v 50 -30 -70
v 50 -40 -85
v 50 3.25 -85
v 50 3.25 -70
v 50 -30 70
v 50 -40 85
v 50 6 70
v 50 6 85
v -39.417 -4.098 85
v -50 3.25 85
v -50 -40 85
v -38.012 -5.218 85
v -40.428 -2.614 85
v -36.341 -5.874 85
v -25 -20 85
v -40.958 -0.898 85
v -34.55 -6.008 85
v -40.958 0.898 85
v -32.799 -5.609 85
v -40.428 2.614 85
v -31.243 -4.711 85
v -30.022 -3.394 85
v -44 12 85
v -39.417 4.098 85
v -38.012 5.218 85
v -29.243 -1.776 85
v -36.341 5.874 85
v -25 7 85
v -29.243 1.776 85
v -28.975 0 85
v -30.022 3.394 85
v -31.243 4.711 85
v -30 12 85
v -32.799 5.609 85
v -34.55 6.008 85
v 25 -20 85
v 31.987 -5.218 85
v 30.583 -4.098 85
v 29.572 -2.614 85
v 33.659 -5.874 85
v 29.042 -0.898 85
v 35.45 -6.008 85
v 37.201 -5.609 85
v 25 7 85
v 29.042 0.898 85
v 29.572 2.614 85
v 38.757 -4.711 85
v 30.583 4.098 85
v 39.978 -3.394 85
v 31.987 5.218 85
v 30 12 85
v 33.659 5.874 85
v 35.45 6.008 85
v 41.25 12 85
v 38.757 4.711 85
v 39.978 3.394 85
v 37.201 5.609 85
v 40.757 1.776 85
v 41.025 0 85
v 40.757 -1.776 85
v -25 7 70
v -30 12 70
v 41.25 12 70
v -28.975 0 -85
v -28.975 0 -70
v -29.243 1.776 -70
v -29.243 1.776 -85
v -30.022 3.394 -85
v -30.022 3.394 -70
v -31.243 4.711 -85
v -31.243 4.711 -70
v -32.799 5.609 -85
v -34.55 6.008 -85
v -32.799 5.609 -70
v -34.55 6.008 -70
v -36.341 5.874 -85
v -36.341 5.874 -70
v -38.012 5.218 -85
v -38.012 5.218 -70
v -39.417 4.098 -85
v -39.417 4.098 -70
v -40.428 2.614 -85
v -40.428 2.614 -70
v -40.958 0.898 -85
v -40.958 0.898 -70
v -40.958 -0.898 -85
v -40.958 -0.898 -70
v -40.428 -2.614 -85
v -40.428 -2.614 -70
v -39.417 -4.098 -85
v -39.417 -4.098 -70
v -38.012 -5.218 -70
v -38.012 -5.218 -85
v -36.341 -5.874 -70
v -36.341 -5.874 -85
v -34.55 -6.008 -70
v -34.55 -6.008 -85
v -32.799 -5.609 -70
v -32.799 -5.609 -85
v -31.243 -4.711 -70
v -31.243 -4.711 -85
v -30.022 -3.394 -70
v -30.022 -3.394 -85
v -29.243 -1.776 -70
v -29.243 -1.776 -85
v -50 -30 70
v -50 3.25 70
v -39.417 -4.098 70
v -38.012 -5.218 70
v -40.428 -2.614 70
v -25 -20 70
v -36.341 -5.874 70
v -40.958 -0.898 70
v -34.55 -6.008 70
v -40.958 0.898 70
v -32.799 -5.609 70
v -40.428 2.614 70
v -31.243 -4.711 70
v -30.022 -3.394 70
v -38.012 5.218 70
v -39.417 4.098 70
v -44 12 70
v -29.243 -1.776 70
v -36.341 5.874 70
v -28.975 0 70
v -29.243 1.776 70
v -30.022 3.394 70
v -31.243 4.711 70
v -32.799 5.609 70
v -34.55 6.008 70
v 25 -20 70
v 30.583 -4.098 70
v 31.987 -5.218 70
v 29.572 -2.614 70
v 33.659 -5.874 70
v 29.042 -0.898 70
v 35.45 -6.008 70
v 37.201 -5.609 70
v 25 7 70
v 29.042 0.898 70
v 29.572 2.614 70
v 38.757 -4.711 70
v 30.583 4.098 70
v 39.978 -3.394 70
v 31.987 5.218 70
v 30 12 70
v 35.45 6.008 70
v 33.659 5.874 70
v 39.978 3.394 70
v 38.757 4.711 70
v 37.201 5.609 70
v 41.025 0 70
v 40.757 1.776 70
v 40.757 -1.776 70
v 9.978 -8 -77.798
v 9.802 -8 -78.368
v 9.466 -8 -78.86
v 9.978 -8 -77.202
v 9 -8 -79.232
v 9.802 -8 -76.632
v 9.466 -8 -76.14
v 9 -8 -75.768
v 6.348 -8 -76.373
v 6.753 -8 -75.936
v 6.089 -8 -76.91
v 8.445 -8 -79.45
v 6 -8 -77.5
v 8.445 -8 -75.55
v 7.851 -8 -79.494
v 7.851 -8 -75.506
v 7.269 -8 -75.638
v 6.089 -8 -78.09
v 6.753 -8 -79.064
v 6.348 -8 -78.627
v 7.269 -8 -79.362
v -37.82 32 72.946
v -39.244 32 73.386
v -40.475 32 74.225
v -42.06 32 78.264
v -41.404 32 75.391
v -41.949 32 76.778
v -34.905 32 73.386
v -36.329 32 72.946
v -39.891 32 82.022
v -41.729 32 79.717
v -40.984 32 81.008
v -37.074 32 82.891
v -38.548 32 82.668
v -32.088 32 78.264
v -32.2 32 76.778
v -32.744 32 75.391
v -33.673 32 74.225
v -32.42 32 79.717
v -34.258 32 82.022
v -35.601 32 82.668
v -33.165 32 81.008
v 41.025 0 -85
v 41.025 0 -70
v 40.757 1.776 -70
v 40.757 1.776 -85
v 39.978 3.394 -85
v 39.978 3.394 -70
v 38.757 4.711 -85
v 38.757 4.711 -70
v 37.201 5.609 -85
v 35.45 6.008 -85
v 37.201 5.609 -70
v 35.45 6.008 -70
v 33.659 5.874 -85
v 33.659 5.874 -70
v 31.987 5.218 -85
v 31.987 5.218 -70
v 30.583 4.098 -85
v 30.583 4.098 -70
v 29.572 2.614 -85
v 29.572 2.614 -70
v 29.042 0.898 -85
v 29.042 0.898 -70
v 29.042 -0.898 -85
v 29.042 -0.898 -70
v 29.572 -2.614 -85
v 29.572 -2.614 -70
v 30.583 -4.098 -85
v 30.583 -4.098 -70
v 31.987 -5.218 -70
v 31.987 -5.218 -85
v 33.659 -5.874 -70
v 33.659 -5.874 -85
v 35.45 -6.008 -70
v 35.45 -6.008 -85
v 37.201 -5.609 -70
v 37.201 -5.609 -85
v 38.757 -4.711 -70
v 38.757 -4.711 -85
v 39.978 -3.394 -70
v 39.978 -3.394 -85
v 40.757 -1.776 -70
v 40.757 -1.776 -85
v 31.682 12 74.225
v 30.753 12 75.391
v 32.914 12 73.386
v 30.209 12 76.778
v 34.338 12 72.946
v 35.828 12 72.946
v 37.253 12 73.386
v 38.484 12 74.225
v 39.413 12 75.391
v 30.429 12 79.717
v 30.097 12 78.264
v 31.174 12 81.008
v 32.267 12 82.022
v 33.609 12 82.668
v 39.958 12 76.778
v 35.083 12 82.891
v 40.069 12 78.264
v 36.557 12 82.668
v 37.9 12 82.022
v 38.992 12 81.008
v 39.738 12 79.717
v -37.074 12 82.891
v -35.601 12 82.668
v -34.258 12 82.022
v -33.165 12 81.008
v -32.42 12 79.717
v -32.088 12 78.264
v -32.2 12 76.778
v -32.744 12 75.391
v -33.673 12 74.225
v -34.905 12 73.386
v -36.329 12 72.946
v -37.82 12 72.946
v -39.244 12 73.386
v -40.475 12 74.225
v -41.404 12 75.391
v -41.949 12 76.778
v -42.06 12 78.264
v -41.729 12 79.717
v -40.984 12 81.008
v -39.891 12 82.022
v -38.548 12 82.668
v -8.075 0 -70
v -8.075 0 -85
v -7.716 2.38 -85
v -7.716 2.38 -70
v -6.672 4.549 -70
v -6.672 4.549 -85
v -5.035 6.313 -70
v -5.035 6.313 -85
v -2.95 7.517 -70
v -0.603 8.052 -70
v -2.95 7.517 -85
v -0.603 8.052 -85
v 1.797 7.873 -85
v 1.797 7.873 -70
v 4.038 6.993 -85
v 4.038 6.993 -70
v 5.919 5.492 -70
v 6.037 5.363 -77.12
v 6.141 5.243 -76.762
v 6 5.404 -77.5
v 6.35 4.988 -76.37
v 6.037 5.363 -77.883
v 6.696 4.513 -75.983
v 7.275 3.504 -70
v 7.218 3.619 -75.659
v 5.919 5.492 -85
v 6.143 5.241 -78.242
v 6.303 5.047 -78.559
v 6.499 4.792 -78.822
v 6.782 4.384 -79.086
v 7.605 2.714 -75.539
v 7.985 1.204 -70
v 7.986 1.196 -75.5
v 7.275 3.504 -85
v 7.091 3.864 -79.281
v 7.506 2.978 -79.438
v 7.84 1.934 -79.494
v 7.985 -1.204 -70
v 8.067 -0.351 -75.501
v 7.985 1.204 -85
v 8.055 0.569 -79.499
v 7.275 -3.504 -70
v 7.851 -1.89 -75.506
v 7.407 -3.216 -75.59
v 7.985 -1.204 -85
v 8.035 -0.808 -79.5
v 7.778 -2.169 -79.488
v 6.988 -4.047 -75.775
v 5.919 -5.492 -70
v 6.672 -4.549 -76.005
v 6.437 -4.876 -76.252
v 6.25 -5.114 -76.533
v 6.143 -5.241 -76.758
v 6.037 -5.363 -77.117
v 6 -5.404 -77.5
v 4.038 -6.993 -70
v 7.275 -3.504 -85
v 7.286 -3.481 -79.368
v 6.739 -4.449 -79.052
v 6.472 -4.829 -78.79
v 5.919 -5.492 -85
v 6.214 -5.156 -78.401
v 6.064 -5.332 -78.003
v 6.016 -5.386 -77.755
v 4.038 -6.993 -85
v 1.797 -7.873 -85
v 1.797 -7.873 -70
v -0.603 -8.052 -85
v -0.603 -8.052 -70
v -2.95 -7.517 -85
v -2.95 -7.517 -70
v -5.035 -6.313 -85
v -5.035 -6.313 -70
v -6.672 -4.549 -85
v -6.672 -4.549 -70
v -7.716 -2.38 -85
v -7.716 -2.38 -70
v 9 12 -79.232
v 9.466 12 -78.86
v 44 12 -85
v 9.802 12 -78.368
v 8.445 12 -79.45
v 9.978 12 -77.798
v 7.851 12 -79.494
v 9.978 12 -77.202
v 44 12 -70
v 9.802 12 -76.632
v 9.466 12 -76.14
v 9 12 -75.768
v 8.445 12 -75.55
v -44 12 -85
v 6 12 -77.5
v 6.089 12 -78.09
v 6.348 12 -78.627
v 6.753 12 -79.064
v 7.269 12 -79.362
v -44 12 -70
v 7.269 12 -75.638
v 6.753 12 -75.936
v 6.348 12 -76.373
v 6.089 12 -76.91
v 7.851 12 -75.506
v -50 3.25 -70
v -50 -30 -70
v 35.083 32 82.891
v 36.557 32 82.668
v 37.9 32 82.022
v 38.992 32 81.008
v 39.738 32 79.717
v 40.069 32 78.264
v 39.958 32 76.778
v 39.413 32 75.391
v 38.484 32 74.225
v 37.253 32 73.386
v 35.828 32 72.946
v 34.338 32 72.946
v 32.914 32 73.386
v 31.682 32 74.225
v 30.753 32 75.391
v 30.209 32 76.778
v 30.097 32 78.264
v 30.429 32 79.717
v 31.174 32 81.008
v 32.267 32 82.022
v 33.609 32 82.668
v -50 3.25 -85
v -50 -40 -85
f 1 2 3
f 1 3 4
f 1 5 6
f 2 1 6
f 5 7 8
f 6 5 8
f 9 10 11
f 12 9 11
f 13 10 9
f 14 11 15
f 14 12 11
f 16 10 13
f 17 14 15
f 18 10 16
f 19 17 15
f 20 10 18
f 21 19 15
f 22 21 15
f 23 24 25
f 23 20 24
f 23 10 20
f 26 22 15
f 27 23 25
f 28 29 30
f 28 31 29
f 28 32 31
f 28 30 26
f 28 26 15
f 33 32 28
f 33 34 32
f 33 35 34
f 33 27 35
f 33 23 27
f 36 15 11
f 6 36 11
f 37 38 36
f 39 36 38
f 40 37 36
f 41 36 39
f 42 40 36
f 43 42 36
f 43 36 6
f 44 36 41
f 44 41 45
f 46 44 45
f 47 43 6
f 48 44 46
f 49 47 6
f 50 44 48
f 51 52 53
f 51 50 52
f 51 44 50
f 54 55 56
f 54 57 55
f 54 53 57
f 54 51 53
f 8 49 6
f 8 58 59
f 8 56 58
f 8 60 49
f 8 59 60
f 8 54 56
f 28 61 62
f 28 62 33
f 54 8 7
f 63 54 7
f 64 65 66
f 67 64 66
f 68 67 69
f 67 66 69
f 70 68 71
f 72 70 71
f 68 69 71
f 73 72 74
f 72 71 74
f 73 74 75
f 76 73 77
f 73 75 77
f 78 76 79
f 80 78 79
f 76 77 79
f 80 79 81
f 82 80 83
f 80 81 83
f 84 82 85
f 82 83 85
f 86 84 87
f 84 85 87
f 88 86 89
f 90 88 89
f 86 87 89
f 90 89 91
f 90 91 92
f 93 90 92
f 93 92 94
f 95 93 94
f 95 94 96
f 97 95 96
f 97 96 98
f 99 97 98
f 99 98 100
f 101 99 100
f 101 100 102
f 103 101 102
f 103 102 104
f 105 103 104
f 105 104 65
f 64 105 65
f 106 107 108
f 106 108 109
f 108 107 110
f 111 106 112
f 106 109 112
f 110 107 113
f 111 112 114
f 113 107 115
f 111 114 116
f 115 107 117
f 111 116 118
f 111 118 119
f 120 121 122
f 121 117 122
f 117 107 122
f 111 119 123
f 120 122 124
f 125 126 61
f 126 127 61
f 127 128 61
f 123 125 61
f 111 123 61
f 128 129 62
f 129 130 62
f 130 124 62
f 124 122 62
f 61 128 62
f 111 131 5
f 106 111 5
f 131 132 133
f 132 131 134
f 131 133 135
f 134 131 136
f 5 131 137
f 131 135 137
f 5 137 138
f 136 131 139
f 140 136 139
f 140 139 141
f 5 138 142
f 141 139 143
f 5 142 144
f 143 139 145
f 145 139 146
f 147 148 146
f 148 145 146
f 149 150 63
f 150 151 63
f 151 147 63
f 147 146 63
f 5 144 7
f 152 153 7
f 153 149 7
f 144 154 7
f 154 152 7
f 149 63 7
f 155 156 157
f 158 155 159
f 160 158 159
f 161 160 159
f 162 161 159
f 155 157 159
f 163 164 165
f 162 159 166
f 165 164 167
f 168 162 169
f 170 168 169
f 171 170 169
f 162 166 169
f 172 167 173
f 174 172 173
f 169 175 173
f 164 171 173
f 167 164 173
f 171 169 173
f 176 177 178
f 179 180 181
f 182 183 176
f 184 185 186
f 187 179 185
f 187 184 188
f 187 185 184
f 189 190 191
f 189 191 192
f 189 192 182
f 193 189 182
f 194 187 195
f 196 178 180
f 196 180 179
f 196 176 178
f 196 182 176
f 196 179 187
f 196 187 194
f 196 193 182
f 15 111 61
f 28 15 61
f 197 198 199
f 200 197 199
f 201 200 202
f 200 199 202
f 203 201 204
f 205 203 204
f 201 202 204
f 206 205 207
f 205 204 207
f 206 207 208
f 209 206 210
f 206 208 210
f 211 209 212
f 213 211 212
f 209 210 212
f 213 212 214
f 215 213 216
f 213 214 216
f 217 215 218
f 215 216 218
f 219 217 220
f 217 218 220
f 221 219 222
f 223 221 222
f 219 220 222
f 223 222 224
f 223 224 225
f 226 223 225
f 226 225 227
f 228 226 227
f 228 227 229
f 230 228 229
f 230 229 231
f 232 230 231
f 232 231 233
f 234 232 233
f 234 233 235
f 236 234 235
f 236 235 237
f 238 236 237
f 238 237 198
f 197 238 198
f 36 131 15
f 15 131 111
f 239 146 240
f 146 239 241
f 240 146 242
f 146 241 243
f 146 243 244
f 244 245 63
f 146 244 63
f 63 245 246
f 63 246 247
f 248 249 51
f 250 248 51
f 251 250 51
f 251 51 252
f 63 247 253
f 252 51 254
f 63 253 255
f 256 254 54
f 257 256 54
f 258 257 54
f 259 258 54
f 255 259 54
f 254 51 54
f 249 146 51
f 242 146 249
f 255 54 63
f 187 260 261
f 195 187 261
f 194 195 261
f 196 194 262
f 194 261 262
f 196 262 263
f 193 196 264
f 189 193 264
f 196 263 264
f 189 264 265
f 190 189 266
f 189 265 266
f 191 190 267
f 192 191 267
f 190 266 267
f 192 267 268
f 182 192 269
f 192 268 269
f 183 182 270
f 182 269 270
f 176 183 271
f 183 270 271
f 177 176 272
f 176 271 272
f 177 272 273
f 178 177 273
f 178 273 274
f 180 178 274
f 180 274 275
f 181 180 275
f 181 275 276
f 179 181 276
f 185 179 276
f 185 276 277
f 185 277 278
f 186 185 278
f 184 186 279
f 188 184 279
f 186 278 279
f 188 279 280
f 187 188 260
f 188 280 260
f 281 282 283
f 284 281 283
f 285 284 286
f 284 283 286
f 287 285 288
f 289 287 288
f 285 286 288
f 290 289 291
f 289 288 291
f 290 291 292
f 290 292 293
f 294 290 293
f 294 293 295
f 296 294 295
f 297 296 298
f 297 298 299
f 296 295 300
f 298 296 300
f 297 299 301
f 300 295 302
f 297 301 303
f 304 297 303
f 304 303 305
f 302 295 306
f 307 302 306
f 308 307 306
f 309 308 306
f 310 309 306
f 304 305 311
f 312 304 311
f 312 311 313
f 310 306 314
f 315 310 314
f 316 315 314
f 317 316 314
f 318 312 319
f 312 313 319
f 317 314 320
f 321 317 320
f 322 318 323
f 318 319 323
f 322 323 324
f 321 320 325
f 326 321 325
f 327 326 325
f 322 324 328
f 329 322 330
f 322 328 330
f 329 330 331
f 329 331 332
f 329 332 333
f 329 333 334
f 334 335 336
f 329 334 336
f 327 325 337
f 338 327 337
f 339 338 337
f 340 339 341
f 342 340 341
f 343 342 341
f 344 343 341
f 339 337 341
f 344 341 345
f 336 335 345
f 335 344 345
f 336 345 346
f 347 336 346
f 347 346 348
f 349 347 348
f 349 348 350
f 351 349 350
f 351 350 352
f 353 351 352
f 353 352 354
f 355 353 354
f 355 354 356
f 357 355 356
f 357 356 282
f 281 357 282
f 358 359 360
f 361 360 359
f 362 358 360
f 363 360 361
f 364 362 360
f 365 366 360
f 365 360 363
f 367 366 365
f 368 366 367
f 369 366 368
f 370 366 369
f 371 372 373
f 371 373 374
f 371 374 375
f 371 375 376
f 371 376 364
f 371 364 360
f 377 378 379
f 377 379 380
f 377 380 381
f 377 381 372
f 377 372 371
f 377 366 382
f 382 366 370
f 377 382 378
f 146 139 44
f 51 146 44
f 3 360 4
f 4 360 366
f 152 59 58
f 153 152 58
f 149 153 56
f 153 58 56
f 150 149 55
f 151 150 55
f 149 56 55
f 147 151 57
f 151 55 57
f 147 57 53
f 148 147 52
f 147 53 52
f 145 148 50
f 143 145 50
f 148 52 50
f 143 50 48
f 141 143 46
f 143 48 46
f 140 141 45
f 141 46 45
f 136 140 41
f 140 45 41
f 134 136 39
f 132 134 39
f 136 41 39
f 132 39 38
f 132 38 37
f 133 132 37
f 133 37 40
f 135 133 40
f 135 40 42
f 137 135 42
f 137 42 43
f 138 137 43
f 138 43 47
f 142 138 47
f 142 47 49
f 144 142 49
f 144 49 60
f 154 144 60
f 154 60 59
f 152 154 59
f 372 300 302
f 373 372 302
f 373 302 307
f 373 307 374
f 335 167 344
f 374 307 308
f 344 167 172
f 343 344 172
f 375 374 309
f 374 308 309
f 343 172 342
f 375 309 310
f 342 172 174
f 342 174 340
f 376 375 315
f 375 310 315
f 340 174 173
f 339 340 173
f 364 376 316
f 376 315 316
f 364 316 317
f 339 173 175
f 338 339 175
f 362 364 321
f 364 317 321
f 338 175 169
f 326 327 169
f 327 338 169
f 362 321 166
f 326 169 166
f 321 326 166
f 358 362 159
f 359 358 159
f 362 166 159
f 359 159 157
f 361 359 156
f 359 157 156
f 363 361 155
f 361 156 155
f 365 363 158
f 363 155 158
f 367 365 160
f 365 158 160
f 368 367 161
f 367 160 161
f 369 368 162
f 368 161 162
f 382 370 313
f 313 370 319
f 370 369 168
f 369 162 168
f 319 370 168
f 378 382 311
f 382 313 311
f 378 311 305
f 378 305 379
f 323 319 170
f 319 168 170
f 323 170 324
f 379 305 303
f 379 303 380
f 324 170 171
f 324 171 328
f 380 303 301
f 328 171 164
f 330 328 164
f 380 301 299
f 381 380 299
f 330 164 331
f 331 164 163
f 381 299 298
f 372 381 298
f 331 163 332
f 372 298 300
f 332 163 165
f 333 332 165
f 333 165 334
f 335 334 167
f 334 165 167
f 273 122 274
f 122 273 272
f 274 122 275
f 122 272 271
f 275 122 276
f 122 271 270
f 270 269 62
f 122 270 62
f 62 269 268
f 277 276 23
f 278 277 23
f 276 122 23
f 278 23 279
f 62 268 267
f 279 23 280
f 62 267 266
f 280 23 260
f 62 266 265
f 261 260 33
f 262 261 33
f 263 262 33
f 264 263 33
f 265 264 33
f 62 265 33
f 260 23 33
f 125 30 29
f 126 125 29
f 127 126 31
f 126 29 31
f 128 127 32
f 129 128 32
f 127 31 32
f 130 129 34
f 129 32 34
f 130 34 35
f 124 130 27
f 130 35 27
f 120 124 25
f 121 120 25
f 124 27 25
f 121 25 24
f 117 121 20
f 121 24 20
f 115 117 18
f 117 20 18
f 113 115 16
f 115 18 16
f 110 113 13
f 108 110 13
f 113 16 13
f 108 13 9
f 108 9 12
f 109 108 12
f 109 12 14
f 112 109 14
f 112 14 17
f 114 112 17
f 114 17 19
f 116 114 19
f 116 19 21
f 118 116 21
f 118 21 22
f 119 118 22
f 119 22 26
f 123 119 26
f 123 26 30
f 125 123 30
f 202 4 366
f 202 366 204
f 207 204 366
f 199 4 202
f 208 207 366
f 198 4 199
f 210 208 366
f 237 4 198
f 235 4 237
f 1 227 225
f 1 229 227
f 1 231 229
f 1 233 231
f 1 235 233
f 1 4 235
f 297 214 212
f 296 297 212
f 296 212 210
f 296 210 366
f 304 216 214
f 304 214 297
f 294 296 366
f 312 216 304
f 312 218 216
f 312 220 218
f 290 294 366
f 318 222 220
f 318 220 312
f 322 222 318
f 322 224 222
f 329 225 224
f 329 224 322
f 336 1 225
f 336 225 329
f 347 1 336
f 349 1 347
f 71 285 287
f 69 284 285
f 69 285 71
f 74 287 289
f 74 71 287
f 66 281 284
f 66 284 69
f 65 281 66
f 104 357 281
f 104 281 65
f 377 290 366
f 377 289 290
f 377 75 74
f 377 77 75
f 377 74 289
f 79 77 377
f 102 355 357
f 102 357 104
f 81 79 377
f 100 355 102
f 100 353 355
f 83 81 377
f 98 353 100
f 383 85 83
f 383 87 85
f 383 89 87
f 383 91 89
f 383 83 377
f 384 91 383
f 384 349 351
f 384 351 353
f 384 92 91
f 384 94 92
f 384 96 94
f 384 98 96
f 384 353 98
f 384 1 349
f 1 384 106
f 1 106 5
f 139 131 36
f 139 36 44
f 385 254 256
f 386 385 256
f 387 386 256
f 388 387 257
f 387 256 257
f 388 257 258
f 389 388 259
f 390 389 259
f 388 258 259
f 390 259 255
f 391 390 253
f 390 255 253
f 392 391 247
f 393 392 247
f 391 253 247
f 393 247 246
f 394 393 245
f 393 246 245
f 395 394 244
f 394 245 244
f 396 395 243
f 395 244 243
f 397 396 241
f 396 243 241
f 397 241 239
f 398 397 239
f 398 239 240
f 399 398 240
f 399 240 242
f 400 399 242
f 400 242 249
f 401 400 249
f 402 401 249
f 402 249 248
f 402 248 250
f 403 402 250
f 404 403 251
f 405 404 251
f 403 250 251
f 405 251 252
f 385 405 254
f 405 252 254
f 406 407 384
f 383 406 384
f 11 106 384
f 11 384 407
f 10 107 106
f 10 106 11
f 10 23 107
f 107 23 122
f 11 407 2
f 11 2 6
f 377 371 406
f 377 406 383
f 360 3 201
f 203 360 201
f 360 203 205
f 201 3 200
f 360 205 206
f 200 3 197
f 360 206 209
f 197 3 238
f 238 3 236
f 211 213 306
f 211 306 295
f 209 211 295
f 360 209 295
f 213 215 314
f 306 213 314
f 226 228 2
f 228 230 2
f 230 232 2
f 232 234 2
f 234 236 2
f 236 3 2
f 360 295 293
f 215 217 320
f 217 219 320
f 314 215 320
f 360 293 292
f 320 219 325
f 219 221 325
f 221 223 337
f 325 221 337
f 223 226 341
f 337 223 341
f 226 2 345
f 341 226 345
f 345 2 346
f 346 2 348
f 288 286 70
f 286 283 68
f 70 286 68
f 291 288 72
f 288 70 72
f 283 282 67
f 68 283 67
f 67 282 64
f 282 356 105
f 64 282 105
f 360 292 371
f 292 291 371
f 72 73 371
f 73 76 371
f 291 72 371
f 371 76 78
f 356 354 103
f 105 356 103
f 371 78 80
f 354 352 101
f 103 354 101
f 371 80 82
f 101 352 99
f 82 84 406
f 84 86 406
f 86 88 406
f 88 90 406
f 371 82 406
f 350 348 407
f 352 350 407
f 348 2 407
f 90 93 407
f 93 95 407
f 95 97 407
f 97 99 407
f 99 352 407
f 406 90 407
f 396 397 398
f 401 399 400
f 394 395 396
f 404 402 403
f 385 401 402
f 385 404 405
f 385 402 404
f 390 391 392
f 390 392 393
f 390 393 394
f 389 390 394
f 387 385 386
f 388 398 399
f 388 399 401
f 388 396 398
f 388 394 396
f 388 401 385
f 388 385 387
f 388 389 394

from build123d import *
from OCP.BRepFilletAPI import BRepFilletAPI_MakeChamfer

# Parameters (mm, degrees)
SKETCH1_W                      = 100
SKETCH1_H                      = 52
BOSS_EXTRUDE1_DEPTH            = 15
SKETCH2_R                      = 6
BOSS_EXTRUDE2_DEPTH            = 140
SKETCH3_W                      = 100
SKETCH3_H                      = 46
BOSS_EXTRUDE3_DEPTH            = 15
SKETCH4_W                      = 100
SKETCH4_H                      = 15
BOSS_EXTRUDE4_DEPTH            = 6
SKETCH5_W                      = 100
SKETCH5_H                      = 10
BOSS_EXTRUDE5_DEPTH            = 30
SKETCH6_W                      = 100
SKETCH6_H                      = 10
BOSS_EXTRUDE6_DEPTH            = 30
SKETCH7_W                      = 50
SKETCH7_H                      = 32
CUT_EXTRUDE1_DEPTH             = 168.705098312
SKETCH8_W                      = 6
SKETCH8_H                      = 1
SKETCH9_W                      = 6
SKETCH9_H                      = 1
SKETCH10_W                     = 6
SKETCH10_H                     = 1
SKETCH11_W                     = 6
SKETCH11_H                     = 1
SKETCH12_W                     = 6
SKETCH12_H                     = 140
F_10_0_10_DIAMETER_HOLE1_D     = 10
F_10_0_10_DIAMETER_HOLE1_DEPTH = 10
F_4_0_4_DIAMETER_HOLE1_D       = 4
F_4_0_4_DIAMETER_HOLE1_DEPTH   = 20
F_16_0_16_DIAMETER_HOLE1_D     = 16
F_16_0_16_DIAMETER_HOLE1_DEPTH = 16
CHAMFER1_SIZE                  = 8.75
CHAMFER1_SIZE2                 = 6
CHAMFER2_SIZE                  = 5
SKETCH19_R                     = 6
CUT_EXTRUDE2_DEPTH             = 300
SKETCH20_W                     = 80
SKETCH20_H                     = 10
BOSS_EXTRUDE7_DEPTH            = 100
SKETCH21_R                     = 5
BOSS_EXTRUDE8_DEPTH            = 10
SKETCH23_R                     = 5
BOSS_EXTRUDE10_DEPTH           = 20
SKETCH24_R                     = 8.075
CUT_EXTRUDE3_DEPTH             = 40
SKETCH25_R                     = 6.025
CUT_EXTRUDE4_DEPTH             = 187


with BuildPart() as part:
    # Sketch1 → Boss-Extrude1 (new body)
    with BuildSketch(Plane.XY.offset(85)):
        with Locations((0, -14)):
            Rectangle(SKETCH1_W, SKETCH1_H)
    extrude(amount=-BOSS_EXTRUDE1_DEPTH)

    # Sketch2 → Boss-Extrude2 (add)
    with BuildSketch(Plane(origin=(0, 0, 70), x_dir=(-1, 0, 0), z_dir=(0, 0, -1))):
        with Locations(Location((35, 0, 0), (0, 0, 180))):
            Circle(SKETCH2_R)
    extrude(amount=BOSS_EXTRUDE2_DEPTH)

    # Sketch3 → Boss-Extrude3 (add)
    with BuildSketch(Plane.XY.offset(-70)):
        with Locations((0, -17)):
            Rectangle(SKETCH3_W, SKETCH3_H)
    extrude(amount=-BOSS_EXTRUDE3_DEPTH)

    # Sketch4 → Boss-Extrude4 (add)
    with BuildSketch(Plane(origin=(0, 6, 0), x_dir=(-1, 0, 0), z_dir=(0, 1, 0))):
        with Locations((0, -77.5)):
            Rectangle(SKETCH4_W, SKETCH4_H)
    extrude(amount=BOSS_EXTRUDE4_DEPTH)

    # Sketch5 → Boss-Extrude5 (add)
    with BuildSketch(Plane(origin=(0, 0, 70), x_dir=(-1, 0, 0), z_dir=(0, 0, -1))):
        with Locations((0, -35)):
            Rectangle(SKETCH5_W, SKETCH5_H)
    extrude(amount=BOSS_EXTRUDE5_DEPTH)

    # Sketch6 → Boss-Extrude6 (add)
    with BuildSketch(Plane.XY.offset(-70)):
        with Locations((0, -35)):
            Rectangle(SKETCH6_W, SKETCH6_H)
    extrude(amount=BOSS_EXTRUDE6_DEPTH)

    # Sketch7 → Cut-Extrude1 (cut, through all)
    with BuildSketch(Plane(origin=(0, 0, 70), x_dir=(-1, 0, 0), z_dir=(0, 0, -1))):
        with Locations((0, -4)):
            Rectangle(SKETCH7_W, SKETCH7_H)
    extrude(amount=-CUT_EXTRUDE1_DEPTH, mode=Mode.SUBTRACT)

    # Sketch8 → Revolve1 (revolve)
    with BuildSketch(Plane(origin=(0, 0, 0), x_dir=(1, 0, 0), z_dir=(0, 1, 0))):
        with Locations((38, 85.5)):
            Rectangle(SKETCH8_W, SKETCH8_H)
    revolve(axis=Axis((35, 0, -86), (0, 0, 1)))

    # Sketch9 → Revolve2 (revolve)
    with BuildSketch(Plane(origin=(0, 0, 0), x_dir=(1, 0, 0), z_dir=(0, 1, 0))):
        with Locations((-32, 85.5)):
            Rectangle(SKETCH9_W, SKETCH9_H)
    revolve(axis=Axis((-35, 0, -86), (0, 0, 1)))

    # Sketch10 → Revolve3 (revolve)
    with BuildSketch(Plane(origin=(0, 0, 0), x_dir=(1, 0, 0), z_dir=(0, 1, 0))):
        with Locations((38, -85.5)):
            Rectangle(SKETCH10_W, SKETCH10_H)
    revolve(axis=Axis((35, 0, 85), (0, 0, 1)))

    # Sketch11 → Revolve4 (revolve)
    with BuildSketch(Plane(origin=(0, 0, 0), x_dir=(1, 0, 0), z_dir=(0, 1, 0))):
        with Locations((-32, -85.5)):
            Rectangle(SKETCH11_W, SKETCH11_H)
    revolve(axis=Axis((-35, 0, 85), (0, 0, 1)))

    # Sketch12 → Revolve5 (revolve)
    with BuildSketch(Plane(origin=(0, 0, 0), x_dir=(1, 0, 0), z_dir=(0, 1, 0))):
        with Locations((38, 0)):
            Rectangle(SKETCH12_W, SKETCH12_H)
    revolve(axis=Axis((35, 0, -70), (0, 0, 1)))

    # Ø10.0 (10) Diameter Hole1
    with Locations(Plane(origin=(0, -40, 0), x_dir=(-1, 0, 0), z_dir=(0, -1, 0))):
        with Locations((35, -55), (-35, -55), (-35, 54.99817447), (35, 54.99817447)):
            Hole(F_10_0_10_DIAMETER_HOLE1_D / 2, depth=F_10_0_10_DIAMETER_HOLE1_DEPTH)

    # Ø4.0 (4) Diameter Hole1
    with Locations(Plane(origin=(0, 12, 0), x_dir=(1, 0, 0), z_dir=(0, 1, 0))):
        with Locations((8, 77.5)):
            Hole(F_4_0_4_DIAMETER_HOLE1_D / 2, depth=F_4_0_4_DIAMETER_HOLE1_DEPTH)

    # Ø16.0 (16) Diameter Hole1
    with Locations(Plane.XY.offset(-70)):
        with Locations((0, 0)):
            Hole(F_16_0_16_DIAMETER_HOLE1_D / 2, depth=F_16_0_16_DIAMETER_HOLE1_DEPTH)

    # Chamfer1: one chamfer whose edges measure the first distance from different faces: ONE call of the kernel's chamfer builder (chamfer() names one face for all edges)
    chamfer1_edges_1 = [part.edges().sort_by_distance(p)[0] for p in [
        (50, 12, -77.5),
    ]]
    chamfer1_side_1 = [part.faces().sort_by_distance(p)[0] for p in [
        (50, -19.833333333, -71.25),
    ]]
    chamfer1_edges_2 = [part.edges().sort_by_distance(p)[0] for p in [
        (-50, 12, -77.5),
    ]]
    chamfer1_side_2 = [part.faces().sort_by_distance(p)[0] for p in [
        (-50, -19.833333333, -71.25),
    ]]
    chamfer1_edges_3 = [part.edges().sort_by_distance(p)[0] for p in [
        (-50, 12, 77.5),
    ]]
    chamfer1_side_3 = [part.faces().sort_by_distance(p)[0] for p in [
        (-50, -19.833333333, 71.25),
    ]]
    chamfer1_edges_4 = [part.edges().sort_by_distance(p)[0] for p in [
        (50, 12, 77.5),
    ]]
    chamfer1_side_4 = [part.faces().sort_by_distance(p)[0] for p in [
        (37.5, 12, 77.5),
    ]]
    chamfer1 = BRepFilletAPI_MakeChamfer(part.part.solid().wrapped)
    for e in chamfer1_edges_1:
        chamfer1.Add(CHAMFER1_SIZE, CHAMFER1_SIZE2, e.wrapped, chamfer1_side_1[0].wrapped)  # the first distance lies on this face
    for e in chamfer1_edges_2:
        chamfer1.Add(CHAMFER1_SIZE, CHAMFER1_SIZE2, e.wrapped, chamfer1_side_2[0].wrapped)  # the first distance lies on this face
    for e in chamfer1_edges_3:
        chamfer1.Add(CHAMFER1_SIZE, CHAMFER1_SIZE2, e.wrapped, chamfer1_side_3[0].wrapped)  # the first distance lies on this face
    for e in chamfer1_edges_4:
        chamfer1.Add(CHAMFER1_SIZE, CHAMFER1_SIZE2, e.wrapped, chamfer1_side_4[0].wrapped)  # the first distance lies on this face
    add(Compound.cast(chamfer1.Shape()), mode=Mode.REPLACE)

    # Chamfer2
    chamfer2_edges = [part.edges().sort_by_distance(p)[0] for p in [
        (-25, 12, 77.5),
        (25, 12, 77.5),
    ]]
    chamfer(chamfer2_edges, length=CHAMFER2_SIZE)

    # Sketch19 → Cut-Extrude2 (cut)
    with BuildSketch(Plane(origin=(0, 0, -86), x_dir=(-1, 0, 0), z_dir=(0, 0, -1))):
        with Locations(Location((-35, 0, 0), (0, 0, 180))):
            Circle(SKETCH19_R)
        with Locations(Location((35, 0, 0), (0, 0, 180))):
            Circle(SKETCH19_R)
    extrude(amount=-CUT_EXTRUDE2_DEPTH, mode=Mode.SUBTRACT)


with BuildPart() as cut_extrude2_piece_1:
    # of the separate pieces the step leaves, piece 1, a body of its own (cut_extrude2_pieces)
    add(part.part.solids().sort_by_distance((-50, 3.25, -70))[0])



with BuildPart() as cut_extrude2_piece_2:
    # of the separate pieces the step leaves, piece 2, a body of its own (cut_extrude2_pieces)
    add(part.part.solids().sort_by_distance((30, 12, 70))[0])


with BuildPart() as cut_extrude2_piece_1_1:
    add(cut_extrude2_piece_1.part)

    add(cut_extrude2_piece_2.part)  # Boss-Extrude7 merges Cut-Extrude2 piece 2
    # Sketch20 → Boss-Extrude7 (add)
    with BuildSketch(Plane.ZY.offset(50)):
        with Locations((0, -35)):
            Rectangle(SKETCH20_W, SKETCH20_H)
    extrude(amount=-BOSS_EXTRUDE7_DEPTH)

    # Sketch21 → Boss-Extrude8 (add)
    with BuildSketch(Plane(origin=(0, -30, 0), x_dir=(1, 0, 0), z_dir=(0, 1, 0))):
        with Locations((-35, 54.99817447)):
            Circle(SKETCH21_R)
        with Locations((35, 54.99817447)):
            Circle(SKETCH21_R)
        with Locations((35, -55)):
            Circle(SKETCH21_R)
        with Locations((-35, -55)):
            Circle(SKETCH21_R)
    extrude(amount=-BOSS_EXTRUDE8_DEPTH)

    # Sketch23 → Boss-Extrude10 (add)
    with BuildSketch(Plane(origin=(0, 12, 0), x_dir=(1, 0, 0), z_dir=(0, 1, 0))):
        with Locations(Location((-37.07435596, -77.890606879, 0), (0, 0, 270))):
            Circle(SKETCH23_R)
        with Locations(Location((35.083214943, -77.890606879, 0), (0, 0, 270))):
            Circle(SKETCH23_R)
    extrude(amount=BOSS_EXTRUDE10_DEPTH)

    # Sketch24 → Cut-Extrude3 (cut)
    with BuildSketch(Plane(origin=(0, 0, -85), x_dir=(-1, 0, 0), z_dir=(0, 0, -1))):
        Circle(SKETCH24_R)
    extrude(amount=-CUT_EXTRUDE3_DEPTH, mode=Mode.SUBTRACT)

    # Sketch25 → Cut-Extrude4 (cut)
    with BuildSketch(Plane.XY.offset(85)):
        with Locations((-35, 0)):
            Circle(SKETCH25_R)
        with Locations((35, 0)):
            Circle(SKETCH25_R)
    extrude(amount=-CUT_EXTRUDE4_DEPTH, mode=Mode.SUBTRACT)


solid = cut_extrude2_piece_1_1.part
